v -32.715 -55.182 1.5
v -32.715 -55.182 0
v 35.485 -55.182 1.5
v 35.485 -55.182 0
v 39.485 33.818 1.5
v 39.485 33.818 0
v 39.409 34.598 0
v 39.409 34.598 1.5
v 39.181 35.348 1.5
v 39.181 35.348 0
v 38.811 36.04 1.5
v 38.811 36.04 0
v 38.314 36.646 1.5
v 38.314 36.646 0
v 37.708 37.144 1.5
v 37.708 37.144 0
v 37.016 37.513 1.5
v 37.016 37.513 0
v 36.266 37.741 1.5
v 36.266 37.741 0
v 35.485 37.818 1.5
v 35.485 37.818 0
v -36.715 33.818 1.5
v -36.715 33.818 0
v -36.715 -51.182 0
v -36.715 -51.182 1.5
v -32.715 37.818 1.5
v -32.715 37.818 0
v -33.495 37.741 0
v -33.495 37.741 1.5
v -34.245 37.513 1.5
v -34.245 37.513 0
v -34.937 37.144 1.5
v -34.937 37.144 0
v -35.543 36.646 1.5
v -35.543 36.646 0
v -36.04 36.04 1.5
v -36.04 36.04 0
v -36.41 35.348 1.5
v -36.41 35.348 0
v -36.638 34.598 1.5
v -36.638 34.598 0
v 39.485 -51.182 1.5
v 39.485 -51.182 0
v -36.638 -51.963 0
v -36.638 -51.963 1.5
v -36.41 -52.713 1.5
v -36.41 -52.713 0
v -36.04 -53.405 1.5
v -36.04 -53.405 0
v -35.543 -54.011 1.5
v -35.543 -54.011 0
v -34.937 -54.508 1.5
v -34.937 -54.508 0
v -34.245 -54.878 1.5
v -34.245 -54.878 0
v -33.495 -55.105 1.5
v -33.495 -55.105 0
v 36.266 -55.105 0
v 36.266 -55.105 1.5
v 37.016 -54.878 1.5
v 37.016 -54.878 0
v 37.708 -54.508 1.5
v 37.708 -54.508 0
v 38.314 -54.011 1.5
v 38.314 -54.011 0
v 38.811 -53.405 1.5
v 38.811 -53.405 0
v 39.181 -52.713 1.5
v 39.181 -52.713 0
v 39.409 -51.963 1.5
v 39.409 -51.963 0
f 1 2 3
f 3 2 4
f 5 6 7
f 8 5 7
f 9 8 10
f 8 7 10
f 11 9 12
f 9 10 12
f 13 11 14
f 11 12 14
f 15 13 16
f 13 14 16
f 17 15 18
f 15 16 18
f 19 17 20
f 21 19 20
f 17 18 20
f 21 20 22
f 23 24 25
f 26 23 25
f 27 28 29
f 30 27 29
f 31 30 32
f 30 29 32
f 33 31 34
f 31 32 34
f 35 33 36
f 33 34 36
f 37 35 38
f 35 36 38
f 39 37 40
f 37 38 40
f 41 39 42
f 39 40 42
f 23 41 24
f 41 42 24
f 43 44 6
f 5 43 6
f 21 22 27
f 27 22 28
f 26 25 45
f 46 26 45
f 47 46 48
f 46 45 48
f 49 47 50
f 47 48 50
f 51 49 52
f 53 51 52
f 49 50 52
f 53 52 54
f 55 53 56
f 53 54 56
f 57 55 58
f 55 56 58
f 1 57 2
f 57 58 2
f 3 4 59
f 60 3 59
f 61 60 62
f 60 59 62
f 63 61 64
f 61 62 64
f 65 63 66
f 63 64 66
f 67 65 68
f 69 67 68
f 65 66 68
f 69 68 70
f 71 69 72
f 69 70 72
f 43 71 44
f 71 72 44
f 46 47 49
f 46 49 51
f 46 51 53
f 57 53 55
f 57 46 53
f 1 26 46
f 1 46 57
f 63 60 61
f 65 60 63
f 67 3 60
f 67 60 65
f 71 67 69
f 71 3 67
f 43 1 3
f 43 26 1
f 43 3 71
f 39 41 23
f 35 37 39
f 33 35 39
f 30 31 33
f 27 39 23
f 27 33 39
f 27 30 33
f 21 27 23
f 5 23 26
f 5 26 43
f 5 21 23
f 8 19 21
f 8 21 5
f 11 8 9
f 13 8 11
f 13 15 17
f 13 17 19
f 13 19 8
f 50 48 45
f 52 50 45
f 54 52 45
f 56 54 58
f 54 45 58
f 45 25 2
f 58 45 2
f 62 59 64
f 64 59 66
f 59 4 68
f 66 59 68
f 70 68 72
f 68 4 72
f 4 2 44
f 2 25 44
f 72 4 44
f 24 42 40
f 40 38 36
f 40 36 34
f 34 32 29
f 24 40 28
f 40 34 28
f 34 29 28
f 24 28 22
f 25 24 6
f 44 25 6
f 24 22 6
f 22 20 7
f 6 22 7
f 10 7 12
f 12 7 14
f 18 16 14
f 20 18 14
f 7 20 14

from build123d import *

# Parameters (mm, degrees)
F0_W     = 71.2
F0_H     = 88
F1_DEPTH = 1.5


with BuildPart() as f1:
    # F0 (on Top) → F1 (new body)
    with BuildSketch(Plane.XY):
        with BuildLine():
            Line((35.485398, 37.817655), (-32.714602, 37.817655))
            ThreePointArc((-32.714602, 37.817655), (-35.543029, 36.646082), (-36.714602, 33.817655))
            Line((-36.714602, 33.817655), (-36.714602, -51.182345))
            ThreePointArc((-36.714602, -51.182345), (-35.543029, -54.010772), (-32.714602, -55.182345))
            Line((-32.714602, -55.182345), (35.485398, -55.182345))
            ThreePointArc((35.485398, -55.182345), (38.313826, -54.010772), (39.485398, -51.182345))
            Line((39.485398, -51.182345), (39.485398, 33.817655))
            ThreePointArc((39.485398, 33.817655), (38.313826, 36.646082), (35.485398, 37.817655))
        make_face()
        with Locations((1.385398, -8.682345)):
            Rectangle(F0_W, F0_H, mode=Mode.SUBTRACT)
        with Locations((1.385398, -8.682345)):
            Rectangle(F0_W, F0_H)
    extrude(amount=F1_DEPTH)


solid = f1.part
